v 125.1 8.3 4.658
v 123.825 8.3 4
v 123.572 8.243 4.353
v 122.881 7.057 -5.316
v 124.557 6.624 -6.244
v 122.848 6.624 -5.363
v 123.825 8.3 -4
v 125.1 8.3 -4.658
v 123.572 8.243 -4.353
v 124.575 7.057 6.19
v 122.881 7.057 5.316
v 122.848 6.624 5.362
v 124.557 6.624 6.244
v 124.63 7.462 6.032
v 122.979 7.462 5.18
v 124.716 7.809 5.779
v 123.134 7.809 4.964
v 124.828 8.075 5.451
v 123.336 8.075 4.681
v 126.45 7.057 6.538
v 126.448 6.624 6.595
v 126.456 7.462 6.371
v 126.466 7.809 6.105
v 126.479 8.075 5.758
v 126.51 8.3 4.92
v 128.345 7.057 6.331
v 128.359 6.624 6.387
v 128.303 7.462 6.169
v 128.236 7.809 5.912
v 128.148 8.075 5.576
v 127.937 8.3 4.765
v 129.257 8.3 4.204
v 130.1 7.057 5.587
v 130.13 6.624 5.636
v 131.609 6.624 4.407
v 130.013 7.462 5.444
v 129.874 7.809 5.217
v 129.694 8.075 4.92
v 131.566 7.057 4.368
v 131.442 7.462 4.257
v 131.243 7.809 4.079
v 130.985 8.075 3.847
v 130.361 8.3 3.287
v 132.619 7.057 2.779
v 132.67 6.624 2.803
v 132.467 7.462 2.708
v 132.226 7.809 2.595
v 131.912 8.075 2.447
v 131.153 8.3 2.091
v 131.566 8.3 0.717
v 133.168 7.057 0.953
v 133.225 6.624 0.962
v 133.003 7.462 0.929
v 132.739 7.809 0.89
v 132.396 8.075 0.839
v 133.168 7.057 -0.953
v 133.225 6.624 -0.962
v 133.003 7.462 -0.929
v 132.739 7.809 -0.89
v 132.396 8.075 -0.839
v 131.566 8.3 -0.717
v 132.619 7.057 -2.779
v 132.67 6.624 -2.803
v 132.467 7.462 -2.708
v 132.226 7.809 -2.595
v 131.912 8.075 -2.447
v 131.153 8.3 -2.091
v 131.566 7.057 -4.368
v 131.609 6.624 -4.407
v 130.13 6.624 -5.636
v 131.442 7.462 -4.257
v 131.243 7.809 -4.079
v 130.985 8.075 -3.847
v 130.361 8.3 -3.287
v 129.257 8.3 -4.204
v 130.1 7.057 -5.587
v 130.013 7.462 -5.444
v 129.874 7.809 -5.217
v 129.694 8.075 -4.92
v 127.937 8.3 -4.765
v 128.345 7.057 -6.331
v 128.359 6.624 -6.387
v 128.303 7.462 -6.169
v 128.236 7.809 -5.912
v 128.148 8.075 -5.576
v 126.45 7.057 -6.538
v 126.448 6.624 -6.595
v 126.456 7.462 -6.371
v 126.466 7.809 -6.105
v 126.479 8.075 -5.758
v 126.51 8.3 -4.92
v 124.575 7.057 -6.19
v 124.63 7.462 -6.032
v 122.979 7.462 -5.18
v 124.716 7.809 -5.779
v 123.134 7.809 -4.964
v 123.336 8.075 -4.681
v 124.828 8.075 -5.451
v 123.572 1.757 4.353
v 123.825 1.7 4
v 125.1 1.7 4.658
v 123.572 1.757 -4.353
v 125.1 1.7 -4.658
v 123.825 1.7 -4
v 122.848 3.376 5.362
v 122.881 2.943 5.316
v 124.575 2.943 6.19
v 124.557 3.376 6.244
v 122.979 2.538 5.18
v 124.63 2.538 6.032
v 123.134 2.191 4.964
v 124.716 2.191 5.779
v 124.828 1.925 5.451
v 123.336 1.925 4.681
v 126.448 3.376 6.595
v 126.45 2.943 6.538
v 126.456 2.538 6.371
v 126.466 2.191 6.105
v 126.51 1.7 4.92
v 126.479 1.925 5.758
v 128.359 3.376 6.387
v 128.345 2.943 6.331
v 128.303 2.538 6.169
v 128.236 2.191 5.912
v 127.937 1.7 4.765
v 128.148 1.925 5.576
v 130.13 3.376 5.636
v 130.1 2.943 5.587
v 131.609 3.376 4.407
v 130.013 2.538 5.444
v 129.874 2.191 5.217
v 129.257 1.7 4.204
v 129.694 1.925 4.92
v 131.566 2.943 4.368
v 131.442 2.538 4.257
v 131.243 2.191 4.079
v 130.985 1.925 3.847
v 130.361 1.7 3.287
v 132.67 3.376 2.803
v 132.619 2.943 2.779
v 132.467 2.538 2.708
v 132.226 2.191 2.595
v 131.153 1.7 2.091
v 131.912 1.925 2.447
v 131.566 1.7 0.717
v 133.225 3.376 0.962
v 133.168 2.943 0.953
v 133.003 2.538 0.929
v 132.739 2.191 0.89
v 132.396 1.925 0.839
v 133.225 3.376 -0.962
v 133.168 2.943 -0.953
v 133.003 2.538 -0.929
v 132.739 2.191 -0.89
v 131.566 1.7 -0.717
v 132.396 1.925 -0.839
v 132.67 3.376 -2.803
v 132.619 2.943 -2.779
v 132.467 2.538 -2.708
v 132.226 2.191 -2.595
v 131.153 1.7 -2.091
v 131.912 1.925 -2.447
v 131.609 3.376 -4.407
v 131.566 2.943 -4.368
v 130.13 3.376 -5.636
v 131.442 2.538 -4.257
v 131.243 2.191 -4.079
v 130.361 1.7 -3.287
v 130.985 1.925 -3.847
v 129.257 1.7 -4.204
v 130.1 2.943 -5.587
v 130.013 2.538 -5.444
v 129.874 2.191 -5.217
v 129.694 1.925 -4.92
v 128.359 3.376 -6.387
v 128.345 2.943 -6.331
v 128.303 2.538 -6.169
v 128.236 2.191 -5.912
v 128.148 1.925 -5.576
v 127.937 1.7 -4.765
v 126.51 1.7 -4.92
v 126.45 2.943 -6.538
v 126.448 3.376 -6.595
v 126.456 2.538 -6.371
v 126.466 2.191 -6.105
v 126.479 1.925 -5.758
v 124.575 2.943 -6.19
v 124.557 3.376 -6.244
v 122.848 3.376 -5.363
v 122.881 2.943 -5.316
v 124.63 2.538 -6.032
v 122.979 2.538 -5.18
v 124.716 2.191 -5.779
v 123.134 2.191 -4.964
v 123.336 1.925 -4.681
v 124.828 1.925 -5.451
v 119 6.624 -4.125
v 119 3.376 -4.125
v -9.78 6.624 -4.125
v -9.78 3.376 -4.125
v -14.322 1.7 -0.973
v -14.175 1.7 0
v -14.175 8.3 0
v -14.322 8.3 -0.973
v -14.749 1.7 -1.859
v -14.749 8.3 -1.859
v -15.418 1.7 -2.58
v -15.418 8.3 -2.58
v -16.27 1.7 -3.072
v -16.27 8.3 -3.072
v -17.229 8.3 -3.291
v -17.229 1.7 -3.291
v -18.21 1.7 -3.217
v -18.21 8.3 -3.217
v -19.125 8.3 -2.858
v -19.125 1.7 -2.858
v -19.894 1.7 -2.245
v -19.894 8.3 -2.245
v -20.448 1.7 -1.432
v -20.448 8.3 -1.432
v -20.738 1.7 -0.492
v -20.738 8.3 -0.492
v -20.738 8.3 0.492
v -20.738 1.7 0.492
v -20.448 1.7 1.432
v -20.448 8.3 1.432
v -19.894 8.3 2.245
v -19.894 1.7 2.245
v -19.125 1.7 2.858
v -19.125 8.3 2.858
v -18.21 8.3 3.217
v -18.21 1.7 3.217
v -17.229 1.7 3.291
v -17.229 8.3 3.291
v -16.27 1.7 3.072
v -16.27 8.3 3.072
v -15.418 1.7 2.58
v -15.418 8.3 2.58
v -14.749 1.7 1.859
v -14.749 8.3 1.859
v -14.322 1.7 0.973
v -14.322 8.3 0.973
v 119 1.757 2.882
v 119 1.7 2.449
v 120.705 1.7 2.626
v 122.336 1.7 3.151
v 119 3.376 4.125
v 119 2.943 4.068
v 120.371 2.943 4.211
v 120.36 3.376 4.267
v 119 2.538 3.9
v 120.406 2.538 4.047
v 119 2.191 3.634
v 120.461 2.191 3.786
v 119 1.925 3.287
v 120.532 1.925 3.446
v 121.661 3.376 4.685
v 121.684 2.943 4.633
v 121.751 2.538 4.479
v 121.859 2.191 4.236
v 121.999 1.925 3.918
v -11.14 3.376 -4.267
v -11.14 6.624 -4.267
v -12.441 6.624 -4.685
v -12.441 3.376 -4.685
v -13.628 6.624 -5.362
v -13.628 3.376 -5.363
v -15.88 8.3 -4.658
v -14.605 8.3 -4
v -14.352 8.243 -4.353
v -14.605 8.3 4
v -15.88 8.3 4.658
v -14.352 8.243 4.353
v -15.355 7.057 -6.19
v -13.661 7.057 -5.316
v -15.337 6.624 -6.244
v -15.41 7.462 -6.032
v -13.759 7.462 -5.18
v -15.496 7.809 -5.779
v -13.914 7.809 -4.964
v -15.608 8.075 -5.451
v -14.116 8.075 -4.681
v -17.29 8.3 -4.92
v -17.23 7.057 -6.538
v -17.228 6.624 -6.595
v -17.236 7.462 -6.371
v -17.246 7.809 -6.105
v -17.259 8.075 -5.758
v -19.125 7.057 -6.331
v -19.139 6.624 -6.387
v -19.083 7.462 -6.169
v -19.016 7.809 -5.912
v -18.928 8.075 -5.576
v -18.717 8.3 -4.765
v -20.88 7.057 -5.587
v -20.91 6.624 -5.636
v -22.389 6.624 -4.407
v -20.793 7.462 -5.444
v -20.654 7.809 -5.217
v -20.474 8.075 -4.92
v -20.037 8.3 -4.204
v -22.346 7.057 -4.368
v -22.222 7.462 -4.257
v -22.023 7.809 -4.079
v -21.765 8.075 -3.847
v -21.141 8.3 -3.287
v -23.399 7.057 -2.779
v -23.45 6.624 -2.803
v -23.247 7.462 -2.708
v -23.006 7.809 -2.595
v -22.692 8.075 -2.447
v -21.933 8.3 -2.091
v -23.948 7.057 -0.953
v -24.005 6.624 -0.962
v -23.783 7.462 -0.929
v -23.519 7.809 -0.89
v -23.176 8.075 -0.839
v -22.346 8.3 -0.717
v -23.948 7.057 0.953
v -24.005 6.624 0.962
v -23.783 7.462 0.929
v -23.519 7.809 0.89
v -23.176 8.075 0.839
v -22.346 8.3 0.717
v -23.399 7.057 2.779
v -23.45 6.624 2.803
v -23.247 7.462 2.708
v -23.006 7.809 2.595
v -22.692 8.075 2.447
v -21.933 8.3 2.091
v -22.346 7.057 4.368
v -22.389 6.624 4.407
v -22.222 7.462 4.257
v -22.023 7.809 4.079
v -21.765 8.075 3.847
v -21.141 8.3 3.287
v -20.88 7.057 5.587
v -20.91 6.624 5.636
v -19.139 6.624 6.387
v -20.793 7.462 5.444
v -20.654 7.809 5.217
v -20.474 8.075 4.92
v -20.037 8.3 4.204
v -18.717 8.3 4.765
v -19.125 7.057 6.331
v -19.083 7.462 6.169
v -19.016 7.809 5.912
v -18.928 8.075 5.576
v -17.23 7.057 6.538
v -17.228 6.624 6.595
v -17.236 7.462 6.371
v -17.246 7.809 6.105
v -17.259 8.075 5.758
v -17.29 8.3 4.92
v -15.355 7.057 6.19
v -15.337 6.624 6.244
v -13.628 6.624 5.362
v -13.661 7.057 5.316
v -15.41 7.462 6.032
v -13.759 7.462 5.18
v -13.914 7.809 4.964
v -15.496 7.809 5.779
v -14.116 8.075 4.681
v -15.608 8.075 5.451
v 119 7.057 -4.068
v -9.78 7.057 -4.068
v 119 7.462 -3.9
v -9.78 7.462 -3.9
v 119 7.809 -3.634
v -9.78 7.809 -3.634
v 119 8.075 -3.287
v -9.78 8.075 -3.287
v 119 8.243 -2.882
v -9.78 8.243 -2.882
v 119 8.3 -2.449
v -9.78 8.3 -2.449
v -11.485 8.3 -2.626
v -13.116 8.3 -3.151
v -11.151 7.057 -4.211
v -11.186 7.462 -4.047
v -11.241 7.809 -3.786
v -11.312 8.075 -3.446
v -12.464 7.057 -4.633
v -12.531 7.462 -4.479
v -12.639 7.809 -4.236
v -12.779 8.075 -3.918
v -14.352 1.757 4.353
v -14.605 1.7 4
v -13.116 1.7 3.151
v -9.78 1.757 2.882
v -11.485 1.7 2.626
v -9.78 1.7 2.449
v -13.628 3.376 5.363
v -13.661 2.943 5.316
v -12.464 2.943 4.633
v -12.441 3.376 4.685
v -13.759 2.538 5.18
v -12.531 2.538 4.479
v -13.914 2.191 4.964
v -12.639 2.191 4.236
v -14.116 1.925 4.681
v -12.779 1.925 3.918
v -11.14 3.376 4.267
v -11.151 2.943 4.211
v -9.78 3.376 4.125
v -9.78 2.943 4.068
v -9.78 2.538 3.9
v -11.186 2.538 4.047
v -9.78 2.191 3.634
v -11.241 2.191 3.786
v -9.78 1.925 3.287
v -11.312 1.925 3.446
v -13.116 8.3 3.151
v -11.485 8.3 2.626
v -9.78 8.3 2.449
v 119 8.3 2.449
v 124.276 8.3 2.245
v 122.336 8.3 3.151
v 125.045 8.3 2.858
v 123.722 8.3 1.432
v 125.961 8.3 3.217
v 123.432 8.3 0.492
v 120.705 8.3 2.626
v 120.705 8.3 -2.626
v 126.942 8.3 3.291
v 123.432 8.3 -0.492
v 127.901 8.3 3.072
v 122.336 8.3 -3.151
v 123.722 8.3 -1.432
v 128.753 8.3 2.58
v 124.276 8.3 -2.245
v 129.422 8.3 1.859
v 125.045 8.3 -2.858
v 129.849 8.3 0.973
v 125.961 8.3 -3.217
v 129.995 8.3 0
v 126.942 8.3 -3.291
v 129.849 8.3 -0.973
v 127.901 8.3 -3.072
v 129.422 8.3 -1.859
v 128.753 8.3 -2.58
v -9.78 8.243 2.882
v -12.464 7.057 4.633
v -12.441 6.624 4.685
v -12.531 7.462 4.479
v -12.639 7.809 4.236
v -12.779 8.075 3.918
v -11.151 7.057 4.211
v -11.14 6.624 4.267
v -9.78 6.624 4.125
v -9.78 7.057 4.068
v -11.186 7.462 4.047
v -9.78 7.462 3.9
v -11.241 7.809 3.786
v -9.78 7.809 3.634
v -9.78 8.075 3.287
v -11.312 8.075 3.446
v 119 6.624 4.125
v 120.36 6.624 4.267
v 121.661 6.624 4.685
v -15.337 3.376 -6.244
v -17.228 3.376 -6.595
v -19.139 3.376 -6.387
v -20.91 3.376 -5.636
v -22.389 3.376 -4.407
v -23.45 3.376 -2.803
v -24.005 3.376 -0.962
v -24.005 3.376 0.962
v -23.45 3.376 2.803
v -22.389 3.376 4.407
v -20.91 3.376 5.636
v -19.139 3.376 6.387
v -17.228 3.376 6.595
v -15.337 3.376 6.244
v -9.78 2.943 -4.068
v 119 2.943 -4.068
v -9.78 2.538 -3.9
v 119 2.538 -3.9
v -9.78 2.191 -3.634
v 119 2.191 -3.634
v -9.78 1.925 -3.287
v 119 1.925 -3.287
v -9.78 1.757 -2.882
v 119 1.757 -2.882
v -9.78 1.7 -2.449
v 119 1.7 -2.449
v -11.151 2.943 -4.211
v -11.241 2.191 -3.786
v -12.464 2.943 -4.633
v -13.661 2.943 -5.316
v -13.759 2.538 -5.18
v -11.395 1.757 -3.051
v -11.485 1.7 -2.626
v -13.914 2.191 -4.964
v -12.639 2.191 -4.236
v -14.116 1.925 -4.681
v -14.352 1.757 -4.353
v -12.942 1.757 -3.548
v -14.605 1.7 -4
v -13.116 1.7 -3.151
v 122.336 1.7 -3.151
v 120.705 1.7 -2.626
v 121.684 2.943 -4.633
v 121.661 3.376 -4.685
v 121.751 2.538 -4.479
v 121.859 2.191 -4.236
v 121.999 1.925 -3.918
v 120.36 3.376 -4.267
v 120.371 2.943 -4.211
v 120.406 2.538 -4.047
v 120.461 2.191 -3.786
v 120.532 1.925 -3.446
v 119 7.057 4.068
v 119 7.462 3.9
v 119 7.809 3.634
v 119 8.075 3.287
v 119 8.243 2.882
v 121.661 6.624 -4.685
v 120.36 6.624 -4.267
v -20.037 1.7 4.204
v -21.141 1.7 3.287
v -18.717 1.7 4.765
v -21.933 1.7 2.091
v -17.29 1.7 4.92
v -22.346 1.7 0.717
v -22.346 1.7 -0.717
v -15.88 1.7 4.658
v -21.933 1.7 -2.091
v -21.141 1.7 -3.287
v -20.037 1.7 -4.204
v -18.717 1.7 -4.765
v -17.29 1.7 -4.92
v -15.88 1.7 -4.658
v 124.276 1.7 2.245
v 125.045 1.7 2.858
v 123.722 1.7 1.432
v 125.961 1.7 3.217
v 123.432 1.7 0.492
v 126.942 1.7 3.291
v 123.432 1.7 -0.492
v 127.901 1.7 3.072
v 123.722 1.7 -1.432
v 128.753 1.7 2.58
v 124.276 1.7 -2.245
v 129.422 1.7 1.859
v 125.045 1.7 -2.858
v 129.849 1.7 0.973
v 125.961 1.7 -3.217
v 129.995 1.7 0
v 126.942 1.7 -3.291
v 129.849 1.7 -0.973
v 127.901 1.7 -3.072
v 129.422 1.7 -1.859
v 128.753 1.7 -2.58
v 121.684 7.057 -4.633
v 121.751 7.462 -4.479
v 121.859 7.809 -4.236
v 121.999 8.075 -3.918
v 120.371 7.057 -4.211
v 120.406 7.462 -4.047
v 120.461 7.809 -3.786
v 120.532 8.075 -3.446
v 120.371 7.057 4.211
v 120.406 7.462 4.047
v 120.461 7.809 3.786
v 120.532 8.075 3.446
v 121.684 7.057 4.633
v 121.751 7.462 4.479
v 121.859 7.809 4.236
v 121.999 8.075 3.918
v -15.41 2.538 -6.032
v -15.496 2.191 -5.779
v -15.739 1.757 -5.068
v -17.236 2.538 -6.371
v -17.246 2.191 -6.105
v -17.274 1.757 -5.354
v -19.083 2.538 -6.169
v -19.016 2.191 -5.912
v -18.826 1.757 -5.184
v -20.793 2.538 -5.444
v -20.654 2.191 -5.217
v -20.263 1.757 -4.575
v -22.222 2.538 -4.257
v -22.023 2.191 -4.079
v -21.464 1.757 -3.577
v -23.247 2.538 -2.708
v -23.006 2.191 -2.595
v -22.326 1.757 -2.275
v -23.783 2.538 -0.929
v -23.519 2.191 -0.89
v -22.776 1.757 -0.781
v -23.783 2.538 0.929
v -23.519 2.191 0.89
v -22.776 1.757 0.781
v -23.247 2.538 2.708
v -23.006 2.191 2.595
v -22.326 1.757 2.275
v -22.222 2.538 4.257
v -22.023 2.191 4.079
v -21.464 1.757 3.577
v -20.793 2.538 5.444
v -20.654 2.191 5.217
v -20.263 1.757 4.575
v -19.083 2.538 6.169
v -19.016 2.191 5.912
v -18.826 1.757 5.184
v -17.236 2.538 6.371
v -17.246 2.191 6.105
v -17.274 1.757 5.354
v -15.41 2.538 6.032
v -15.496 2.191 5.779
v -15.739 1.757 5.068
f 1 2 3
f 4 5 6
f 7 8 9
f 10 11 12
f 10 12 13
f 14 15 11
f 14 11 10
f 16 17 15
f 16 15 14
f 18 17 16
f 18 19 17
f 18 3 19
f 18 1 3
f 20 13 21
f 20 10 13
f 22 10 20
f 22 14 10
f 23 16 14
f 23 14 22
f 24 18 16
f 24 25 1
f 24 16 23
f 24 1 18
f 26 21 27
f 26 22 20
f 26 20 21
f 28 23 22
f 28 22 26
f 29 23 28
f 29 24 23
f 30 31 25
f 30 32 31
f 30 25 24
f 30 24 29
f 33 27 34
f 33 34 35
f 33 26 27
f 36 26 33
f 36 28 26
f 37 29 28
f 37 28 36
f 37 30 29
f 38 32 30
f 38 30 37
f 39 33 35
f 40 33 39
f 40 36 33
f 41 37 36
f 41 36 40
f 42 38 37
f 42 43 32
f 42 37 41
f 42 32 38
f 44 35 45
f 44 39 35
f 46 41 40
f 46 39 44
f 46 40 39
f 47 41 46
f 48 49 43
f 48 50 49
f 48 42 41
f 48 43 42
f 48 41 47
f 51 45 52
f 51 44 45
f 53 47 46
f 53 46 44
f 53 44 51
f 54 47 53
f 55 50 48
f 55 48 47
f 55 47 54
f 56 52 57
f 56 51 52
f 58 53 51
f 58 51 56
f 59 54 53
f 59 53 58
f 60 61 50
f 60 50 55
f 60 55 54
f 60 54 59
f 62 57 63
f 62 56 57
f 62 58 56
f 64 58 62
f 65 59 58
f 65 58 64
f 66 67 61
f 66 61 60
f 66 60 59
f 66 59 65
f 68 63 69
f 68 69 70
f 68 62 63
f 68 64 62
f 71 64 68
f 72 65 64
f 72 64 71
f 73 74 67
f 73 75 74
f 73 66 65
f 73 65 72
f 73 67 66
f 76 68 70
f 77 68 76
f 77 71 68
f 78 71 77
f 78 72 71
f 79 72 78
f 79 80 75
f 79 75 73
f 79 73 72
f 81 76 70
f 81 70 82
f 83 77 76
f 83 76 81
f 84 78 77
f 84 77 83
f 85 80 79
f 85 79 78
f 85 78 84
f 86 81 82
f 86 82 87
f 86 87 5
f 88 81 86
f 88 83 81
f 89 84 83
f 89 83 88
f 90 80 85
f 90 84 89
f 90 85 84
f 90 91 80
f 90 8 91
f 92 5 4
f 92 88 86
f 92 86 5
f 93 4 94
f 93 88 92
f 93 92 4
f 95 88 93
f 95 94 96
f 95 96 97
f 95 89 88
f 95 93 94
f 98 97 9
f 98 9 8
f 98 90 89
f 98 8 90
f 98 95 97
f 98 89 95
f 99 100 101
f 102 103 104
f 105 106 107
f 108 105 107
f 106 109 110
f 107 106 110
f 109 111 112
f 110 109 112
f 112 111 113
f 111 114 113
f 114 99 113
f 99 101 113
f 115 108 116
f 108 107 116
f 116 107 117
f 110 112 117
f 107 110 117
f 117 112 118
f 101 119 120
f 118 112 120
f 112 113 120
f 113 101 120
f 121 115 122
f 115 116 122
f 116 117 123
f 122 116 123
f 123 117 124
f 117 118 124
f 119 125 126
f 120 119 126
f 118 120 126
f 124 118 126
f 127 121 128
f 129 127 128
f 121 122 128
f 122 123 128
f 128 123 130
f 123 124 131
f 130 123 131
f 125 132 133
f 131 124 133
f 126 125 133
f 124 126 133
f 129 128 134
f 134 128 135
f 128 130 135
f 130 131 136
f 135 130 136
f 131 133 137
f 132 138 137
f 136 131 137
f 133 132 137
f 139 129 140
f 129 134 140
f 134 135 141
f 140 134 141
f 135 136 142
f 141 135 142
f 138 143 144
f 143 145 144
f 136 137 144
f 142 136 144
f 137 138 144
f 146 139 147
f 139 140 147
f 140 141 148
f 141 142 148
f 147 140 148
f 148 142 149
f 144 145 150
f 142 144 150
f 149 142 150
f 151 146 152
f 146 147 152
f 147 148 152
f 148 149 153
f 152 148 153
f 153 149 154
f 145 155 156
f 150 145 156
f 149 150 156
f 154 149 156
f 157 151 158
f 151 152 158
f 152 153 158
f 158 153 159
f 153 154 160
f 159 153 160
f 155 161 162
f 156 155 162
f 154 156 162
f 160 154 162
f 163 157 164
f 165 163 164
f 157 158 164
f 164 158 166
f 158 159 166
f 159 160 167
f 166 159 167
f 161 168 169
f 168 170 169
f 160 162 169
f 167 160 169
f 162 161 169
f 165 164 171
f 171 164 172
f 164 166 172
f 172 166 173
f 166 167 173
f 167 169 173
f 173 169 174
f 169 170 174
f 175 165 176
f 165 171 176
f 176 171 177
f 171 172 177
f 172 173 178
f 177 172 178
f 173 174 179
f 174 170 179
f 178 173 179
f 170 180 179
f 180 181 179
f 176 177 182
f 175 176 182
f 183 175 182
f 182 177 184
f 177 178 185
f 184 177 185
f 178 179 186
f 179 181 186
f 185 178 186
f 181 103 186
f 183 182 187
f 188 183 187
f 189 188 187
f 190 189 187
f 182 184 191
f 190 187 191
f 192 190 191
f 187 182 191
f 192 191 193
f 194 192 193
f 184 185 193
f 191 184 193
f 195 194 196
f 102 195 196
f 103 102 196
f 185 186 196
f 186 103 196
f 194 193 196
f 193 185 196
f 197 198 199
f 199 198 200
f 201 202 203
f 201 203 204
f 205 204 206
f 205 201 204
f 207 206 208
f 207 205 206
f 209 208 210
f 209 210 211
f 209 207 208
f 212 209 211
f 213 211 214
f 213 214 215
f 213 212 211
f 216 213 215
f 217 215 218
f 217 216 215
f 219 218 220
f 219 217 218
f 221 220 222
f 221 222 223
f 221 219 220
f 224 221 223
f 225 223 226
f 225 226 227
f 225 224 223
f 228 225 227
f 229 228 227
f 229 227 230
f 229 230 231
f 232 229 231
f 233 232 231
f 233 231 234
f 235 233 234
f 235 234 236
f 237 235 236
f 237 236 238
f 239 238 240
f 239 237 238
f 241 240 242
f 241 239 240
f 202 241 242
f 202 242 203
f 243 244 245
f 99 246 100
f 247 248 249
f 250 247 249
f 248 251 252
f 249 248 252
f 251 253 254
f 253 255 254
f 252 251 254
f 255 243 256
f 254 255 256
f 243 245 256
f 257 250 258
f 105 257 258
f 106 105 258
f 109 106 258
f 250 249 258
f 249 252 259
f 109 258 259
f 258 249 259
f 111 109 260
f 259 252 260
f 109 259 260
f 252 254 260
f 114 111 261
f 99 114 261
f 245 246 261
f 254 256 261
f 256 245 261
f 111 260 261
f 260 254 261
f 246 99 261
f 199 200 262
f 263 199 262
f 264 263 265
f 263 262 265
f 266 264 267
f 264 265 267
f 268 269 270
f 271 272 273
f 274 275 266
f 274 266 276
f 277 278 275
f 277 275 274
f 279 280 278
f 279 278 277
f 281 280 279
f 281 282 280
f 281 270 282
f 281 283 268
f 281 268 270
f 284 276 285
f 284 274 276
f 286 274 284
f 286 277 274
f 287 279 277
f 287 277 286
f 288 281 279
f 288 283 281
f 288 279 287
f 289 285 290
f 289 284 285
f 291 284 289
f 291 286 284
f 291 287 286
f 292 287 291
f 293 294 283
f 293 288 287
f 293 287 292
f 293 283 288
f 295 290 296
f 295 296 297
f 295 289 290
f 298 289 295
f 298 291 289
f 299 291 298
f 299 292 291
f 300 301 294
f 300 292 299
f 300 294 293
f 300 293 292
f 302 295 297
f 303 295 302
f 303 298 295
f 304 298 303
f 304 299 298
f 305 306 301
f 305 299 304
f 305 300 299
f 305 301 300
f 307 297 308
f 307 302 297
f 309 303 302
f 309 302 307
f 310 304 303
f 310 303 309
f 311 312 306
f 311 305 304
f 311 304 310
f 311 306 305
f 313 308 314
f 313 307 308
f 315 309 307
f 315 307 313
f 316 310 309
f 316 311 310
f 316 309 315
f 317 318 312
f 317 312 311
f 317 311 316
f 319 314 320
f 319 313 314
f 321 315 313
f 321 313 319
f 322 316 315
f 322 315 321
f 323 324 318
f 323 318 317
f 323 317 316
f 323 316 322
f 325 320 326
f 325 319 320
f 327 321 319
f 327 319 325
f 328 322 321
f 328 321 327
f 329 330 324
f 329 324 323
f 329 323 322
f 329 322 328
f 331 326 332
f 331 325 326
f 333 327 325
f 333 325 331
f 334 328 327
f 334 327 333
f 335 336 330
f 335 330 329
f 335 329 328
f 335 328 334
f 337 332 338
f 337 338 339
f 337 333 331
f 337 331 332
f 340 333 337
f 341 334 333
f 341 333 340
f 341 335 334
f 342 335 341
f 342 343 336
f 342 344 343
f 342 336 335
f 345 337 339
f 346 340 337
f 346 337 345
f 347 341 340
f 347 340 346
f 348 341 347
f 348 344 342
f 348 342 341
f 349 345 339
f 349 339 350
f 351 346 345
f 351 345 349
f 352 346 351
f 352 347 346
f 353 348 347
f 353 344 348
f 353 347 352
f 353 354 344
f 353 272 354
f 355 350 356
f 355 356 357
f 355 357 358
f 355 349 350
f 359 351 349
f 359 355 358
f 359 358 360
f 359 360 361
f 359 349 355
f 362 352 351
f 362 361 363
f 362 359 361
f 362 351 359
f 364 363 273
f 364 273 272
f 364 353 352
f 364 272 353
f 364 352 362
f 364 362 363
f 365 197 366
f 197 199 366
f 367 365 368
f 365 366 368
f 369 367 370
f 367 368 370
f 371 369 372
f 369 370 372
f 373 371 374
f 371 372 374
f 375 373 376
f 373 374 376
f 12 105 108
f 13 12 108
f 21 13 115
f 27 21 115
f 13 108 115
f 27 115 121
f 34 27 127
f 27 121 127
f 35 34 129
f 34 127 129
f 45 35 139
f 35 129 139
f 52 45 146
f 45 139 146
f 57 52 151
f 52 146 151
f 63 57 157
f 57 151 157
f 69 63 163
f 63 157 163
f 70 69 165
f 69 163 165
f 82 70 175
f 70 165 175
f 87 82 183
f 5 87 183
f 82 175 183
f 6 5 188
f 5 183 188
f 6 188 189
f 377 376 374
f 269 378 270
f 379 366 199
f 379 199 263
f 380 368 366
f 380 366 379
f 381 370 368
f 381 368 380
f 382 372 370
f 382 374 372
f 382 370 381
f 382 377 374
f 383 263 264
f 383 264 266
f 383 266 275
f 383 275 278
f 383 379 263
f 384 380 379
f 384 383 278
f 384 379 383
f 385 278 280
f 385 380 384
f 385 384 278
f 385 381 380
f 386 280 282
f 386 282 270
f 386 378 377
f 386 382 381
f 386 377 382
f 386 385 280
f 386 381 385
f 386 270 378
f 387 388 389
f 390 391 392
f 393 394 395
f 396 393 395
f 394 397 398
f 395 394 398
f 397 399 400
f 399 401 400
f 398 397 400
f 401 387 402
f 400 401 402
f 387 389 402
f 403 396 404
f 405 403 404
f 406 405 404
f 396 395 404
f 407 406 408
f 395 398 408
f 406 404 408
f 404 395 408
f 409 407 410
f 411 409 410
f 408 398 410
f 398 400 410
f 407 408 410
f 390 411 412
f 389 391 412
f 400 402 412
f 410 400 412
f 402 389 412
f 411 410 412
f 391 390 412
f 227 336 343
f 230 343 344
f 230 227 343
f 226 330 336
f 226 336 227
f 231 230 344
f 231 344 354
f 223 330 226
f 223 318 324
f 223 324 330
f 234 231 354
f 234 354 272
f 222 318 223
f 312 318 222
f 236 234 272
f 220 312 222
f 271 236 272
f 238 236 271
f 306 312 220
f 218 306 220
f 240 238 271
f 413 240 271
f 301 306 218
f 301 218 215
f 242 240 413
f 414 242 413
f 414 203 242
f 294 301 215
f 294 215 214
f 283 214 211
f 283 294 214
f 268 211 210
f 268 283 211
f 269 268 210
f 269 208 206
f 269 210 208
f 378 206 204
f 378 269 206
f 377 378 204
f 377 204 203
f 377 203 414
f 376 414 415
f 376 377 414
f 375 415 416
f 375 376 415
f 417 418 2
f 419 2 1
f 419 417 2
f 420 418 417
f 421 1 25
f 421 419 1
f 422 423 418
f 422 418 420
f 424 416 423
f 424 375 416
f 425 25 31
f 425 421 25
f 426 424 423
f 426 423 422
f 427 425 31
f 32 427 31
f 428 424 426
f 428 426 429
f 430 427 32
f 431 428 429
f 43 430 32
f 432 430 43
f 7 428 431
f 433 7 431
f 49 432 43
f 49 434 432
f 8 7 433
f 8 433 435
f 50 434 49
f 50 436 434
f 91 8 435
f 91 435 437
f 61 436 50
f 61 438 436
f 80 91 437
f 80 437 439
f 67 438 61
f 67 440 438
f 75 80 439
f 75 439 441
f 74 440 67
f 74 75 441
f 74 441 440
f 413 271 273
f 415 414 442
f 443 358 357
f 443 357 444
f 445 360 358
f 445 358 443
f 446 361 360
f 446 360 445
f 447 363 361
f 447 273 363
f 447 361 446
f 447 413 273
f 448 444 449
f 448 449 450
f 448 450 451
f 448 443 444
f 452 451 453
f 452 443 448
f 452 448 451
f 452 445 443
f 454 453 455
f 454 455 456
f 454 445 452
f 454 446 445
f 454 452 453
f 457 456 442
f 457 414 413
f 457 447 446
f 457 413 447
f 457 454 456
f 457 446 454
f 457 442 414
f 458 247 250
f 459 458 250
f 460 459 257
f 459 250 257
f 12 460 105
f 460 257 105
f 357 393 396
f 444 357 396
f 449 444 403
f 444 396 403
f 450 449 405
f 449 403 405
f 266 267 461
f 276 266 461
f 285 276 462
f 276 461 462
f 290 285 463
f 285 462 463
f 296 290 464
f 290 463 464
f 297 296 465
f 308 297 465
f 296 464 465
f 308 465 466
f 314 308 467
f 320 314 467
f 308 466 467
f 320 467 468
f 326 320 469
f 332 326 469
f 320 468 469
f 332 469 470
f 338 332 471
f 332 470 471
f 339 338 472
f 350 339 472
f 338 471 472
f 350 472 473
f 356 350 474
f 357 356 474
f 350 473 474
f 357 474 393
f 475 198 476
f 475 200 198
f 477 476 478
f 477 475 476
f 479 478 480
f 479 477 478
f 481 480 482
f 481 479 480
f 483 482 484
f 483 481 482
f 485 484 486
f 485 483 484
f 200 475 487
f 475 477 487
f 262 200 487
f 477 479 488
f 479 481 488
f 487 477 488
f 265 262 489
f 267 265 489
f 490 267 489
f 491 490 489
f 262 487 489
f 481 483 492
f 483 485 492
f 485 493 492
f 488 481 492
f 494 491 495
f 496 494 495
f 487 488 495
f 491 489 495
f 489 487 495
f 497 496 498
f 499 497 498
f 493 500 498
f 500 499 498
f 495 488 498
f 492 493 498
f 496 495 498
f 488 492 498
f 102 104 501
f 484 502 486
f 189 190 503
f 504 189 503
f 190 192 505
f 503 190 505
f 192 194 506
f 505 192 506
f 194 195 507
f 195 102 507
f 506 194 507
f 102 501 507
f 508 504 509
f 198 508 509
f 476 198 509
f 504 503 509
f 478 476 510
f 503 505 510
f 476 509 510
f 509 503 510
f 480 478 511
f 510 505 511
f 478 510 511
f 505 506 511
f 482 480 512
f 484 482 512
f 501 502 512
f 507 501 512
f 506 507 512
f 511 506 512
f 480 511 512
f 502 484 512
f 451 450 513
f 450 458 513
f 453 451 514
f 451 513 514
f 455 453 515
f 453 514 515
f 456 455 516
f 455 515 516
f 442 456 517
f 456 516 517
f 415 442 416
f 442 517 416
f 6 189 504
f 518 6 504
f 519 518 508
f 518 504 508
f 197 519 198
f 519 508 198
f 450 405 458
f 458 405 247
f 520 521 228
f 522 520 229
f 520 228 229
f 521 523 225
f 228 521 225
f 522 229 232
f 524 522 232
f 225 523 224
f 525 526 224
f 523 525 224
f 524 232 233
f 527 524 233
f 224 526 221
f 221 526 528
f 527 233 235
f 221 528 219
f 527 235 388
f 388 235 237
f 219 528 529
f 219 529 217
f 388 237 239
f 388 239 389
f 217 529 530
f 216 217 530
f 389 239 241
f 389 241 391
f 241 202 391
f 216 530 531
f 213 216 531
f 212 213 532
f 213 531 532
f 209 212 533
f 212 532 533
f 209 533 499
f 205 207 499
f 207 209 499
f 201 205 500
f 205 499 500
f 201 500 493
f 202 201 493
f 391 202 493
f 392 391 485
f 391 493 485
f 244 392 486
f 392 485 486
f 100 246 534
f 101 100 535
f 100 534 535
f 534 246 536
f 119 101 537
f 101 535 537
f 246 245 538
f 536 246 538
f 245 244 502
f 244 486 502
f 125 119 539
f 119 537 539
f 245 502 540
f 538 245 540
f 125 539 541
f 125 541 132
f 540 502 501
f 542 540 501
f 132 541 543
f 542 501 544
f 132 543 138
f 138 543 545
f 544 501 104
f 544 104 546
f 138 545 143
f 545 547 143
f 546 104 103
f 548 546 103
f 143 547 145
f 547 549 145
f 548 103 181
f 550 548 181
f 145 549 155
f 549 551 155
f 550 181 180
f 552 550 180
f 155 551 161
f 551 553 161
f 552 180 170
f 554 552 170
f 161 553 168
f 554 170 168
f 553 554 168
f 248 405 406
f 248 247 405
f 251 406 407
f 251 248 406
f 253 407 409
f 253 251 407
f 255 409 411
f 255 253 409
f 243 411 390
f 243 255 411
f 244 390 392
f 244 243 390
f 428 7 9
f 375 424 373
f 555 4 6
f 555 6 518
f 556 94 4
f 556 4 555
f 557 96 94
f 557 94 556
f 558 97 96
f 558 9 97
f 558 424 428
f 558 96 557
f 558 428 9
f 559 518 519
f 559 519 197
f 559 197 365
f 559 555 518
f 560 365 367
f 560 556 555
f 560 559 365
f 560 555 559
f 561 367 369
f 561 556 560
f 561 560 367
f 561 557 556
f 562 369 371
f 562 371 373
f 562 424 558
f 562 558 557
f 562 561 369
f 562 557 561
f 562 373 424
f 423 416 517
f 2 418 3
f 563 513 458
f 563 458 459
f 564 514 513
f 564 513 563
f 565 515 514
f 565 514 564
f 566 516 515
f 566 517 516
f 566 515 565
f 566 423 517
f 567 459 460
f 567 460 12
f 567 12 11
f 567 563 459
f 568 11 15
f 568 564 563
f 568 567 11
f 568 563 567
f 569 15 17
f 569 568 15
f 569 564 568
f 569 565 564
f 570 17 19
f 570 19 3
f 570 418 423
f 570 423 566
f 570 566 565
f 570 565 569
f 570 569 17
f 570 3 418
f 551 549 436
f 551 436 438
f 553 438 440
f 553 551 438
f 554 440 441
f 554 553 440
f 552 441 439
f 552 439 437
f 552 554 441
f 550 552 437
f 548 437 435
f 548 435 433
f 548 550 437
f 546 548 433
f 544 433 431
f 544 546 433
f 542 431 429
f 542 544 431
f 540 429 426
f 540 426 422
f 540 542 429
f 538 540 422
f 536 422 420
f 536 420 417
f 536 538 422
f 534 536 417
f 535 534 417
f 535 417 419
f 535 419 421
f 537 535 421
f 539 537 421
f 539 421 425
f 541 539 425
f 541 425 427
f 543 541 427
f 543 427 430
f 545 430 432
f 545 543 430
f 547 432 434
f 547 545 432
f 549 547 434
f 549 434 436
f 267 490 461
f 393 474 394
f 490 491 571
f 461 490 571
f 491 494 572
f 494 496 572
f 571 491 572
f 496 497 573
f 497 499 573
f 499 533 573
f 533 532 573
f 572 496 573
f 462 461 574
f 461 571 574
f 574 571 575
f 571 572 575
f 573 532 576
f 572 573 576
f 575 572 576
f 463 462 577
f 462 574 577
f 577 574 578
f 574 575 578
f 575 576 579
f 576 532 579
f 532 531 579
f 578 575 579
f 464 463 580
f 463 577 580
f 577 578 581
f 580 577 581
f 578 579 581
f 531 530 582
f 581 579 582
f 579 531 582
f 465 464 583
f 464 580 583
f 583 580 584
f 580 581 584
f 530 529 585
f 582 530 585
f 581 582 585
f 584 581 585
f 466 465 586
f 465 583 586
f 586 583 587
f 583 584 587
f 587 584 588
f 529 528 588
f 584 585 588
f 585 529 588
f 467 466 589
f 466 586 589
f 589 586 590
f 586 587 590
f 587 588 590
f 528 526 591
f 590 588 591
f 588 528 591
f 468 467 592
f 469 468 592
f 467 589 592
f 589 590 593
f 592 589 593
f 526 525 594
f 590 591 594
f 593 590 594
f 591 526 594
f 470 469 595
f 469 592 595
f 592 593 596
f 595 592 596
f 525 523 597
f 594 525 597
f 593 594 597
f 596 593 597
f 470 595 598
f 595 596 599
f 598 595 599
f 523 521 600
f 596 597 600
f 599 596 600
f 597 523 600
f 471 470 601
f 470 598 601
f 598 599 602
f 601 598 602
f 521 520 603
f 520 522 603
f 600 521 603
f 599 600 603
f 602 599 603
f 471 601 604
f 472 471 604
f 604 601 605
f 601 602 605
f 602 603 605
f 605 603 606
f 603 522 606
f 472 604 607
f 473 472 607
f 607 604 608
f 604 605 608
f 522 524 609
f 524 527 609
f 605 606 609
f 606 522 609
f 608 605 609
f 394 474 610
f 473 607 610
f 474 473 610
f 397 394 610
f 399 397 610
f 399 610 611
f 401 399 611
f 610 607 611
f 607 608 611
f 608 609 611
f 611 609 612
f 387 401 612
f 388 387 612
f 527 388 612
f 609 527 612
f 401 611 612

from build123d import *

# Parameters (mm, degrees)
SKETCH1_R           = 5
BOSS_EXTRUDE1_DEPTH = 10
FILLET1_R           = 2.54
SCALE1_SCALE        = 0.66


with BuildPart() as part:
    # Sketch1 → Boss-Extrude1 (new body)
    with BuildSketch(Plane(origin=(0, 0, 0), x_dir=(1, 0, 0), z_dir=(0, 1, 0))):
        with BuildLine():
            Line((-42.950776184, -6.25), (152.170776184, -6.25))
            ThreePointArc((152.170776184, -6.25), (155.232638362, -6.730283618), (158.000388092, -8.125))
            ThreePointArc((158.000388092, -8.125), (173.83, 0), (158.000388092, 8.125))
            ThreePointArc((158.000388092, 8.125), (155.232638362, 6.730283618), (152.170776184, 6.25))
            Line((152.170776184, 6.25), (-42.950776184, 6.25))
            ThreePointArc((-42.950776184, 6.25), (-46.012638362, 6.730283618), (-48.780388092, 8.125))
            ThreePointArc((-48.780388092, 8.125), (-64.61, 0), (-48.780388092, -8.125))
            ThreePointArc((-48.780388092, -8.125), (-46.012638362, -6.730283618), (-42.950776184, -6.25))
        make_face()
        with Locations((-54.61, 0)):
            Circle(SKETCH1_R, mode=Mode.SUBTRACT)
        with Locations((163.83, 0)):
            Circle(SKETCH1_R, mode=Mode.SUBTRACT)
    extrude(amount=BOSS_EXTRUDE1_DEPTH)

    # Fillet1
    fillet1_edges = [part.edges().sort_by_distance(p)[0] for p in [
        (-46.012638362, 10, 6.730283618),
        (-64.61, 0, 0),
        (-46.012638362, 0, -6.730283618),
        (54.61, 10, 6.25),
        (155.232638362, 10, 6.730283618),
        (173.83, 10, 0),
        (155.232638362, 10, -6.730283618),
        (54.61, 10, -6.25),
        (-46.012638362, 10, -6.730283618),
        (-64.61, 10, 0),
        (54.61, 0, -6.25),
        (155.232638362, 0, -6.730283618),
        (173.83, 0, 0),
        (155.232638362, 0, 6.730283618),
        (54.61, 0, 6.25),
        (-46.012638362, 0, 6.730283618),
    ]]
    fillet(fillet1_edges, radius=FILLET1_R)


with BuildPart() as part_1:
    # Scale1: scaled about (54.61, 5, 0)
    add(part.part.scale(SCALE1_SCALE).moved(Location((18.5674, 1.7, 0))))


solid = part_1.part
